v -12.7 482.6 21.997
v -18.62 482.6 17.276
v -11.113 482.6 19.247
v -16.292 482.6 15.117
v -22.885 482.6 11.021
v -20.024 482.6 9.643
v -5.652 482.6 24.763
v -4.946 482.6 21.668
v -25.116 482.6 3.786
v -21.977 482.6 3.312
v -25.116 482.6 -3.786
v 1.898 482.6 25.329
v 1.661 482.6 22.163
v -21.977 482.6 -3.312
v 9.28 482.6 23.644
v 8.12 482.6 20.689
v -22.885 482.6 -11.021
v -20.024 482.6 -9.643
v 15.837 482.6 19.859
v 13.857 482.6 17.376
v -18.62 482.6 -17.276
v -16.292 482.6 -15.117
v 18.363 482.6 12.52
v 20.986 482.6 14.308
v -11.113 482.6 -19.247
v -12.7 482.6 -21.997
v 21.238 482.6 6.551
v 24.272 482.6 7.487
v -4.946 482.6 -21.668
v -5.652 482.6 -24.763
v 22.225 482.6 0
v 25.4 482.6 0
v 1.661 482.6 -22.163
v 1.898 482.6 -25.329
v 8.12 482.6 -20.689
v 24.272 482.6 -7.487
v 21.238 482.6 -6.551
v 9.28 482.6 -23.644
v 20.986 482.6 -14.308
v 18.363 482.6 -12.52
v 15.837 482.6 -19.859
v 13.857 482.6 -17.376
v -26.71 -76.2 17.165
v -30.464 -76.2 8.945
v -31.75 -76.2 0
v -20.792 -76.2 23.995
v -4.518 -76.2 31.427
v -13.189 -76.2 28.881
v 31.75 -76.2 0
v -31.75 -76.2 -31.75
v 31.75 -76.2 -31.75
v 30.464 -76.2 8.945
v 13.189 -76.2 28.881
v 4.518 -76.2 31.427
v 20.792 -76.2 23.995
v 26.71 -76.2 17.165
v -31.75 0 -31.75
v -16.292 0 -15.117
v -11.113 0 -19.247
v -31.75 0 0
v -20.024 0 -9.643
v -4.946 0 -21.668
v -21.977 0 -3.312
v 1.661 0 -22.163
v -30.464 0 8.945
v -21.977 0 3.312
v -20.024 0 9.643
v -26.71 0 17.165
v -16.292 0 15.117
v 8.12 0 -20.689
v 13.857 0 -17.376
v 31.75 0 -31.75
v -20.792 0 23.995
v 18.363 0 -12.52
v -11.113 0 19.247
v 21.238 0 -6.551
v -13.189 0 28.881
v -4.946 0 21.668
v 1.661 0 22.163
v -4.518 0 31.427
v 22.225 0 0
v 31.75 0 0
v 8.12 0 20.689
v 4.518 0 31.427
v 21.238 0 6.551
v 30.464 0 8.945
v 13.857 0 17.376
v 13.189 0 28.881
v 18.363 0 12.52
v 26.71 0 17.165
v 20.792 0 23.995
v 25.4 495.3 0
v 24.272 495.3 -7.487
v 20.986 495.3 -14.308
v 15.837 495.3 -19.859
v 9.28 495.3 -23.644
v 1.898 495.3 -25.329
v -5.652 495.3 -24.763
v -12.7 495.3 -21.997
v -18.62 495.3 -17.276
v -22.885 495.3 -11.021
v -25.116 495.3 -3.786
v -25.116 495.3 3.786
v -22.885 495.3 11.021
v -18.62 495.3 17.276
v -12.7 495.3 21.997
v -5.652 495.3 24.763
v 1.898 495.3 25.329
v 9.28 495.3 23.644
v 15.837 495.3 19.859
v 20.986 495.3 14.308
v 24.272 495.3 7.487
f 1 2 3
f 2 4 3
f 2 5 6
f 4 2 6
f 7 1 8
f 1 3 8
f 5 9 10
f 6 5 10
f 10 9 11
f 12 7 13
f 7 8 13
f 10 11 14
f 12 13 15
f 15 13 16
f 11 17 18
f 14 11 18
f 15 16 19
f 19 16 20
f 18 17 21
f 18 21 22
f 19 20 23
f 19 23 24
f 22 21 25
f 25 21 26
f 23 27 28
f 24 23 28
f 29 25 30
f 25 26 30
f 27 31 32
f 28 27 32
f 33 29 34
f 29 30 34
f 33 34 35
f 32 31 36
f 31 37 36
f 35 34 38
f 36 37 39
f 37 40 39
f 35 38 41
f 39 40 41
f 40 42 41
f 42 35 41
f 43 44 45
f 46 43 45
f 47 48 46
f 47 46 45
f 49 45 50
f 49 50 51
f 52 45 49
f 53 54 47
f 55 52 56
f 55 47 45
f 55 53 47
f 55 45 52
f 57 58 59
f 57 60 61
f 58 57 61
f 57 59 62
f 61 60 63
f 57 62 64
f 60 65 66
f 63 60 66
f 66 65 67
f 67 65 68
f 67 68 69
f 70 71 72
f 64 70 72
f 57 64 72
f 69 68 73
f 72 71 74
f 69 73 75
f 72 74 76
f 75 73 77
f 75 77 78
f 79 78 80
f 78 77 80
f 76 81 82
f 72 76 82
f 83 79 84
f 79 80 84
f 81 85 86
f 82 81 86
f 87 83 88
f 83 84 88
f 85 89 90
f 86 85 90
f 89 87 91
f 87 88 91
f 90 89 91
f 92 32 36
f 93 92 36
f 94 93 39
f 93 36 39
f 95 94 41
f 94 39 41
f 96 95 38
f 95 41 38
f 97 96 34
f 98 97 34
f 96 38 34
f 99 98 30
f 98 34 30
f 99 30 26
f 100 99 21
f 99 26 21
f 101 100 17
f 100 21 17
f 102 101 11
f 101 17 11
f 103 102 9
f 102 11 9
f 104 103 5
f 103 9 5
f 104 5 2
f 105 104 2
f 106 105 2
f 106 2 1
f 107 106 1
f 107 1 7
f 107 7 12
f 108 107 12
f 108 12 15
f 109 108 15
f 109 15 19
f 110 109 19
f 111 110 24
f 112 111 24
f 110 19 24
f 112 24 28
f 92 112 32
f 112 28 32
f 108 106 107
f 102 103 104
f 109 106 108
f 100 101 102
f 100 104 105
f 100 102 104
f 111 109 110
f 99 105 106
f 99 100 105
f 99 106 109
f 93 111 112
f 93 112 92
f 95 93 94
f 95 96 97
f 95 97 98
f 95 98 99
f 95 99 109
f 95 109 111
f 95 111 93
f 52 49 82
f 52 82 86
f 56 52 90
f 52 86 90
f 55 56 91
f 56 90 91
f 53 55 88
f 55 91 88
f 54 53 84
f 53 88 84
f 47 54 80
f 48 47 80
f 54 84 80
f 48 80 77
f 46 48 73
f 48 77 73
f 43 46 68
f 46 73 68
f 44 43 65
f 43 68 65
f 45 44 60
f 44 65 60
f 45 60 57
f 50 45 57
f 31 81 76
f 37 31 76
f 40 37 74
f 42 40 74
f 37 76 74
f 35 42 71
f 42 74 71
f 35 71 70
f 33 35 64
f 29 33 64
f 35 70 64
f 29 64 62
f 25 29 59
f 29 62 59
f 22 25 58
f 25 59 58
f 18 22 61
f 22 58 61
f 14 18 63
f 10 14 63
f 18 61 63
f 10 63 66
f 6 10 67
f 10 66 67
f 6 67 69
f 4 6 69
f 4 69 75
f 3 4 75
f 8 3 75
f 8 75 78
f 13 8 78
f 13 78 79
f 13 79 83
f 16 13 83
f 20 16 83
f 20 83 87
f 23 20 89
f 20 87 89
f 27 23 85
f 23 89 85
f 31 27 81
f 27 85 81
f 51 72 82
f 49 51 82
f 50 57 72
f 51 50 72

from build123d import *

# Parameters (mm, degrees)
SKETCH1_R           = 22.225
BOSS_EXTRUDE1_DEPTH = 482.6
SKETCH2_R           = 25.4
BOSS_EXTRUDE2_DEPTH = 12.7
BOSS_EXTRUDE3_DEPTH = 76.2


with BuildPart() as part:
    # Sketch1 → Boss-Extrude1 (new body)
    with BuildSketch(Plane(origin=(0, 0, 0), x_dir=(1, 0, 0), z_dir=(0, 1, 0))):
        Circle(SKETCH1_R)
    extrude(amount=BOSS_EXTRUDE1_DEPTH)

    # Sketch2 → Boss-Extrude2 (add)
    with BuildSketch(Plane(origin=(0, 482.6, 0), x_dir=(1, 0, 0), z_dir=(0, 1, 0))):
        Circle(SKETCH2_R)
    extrude(amount=BOSS_EXTRUDE2_DEPTH)

    # Sketch3 → Boss-Extrude3 (add)
    with BuildSketch(Plane.XZ):
        with BuildLine():
            Line((-31.75, 0), (-31.75, -31.75))
            Line((-31.75, -31.75), (31.75, -31.75))
            Line((31.75, -31.75), (31.75, 0))
            ThreePointArc((31.75, 0), (0, 31.75), (-31.75, 0))
        make_face()
    extrude(amount=BOSS_EXTRUDE3_DEPTH)


solid = part.part
